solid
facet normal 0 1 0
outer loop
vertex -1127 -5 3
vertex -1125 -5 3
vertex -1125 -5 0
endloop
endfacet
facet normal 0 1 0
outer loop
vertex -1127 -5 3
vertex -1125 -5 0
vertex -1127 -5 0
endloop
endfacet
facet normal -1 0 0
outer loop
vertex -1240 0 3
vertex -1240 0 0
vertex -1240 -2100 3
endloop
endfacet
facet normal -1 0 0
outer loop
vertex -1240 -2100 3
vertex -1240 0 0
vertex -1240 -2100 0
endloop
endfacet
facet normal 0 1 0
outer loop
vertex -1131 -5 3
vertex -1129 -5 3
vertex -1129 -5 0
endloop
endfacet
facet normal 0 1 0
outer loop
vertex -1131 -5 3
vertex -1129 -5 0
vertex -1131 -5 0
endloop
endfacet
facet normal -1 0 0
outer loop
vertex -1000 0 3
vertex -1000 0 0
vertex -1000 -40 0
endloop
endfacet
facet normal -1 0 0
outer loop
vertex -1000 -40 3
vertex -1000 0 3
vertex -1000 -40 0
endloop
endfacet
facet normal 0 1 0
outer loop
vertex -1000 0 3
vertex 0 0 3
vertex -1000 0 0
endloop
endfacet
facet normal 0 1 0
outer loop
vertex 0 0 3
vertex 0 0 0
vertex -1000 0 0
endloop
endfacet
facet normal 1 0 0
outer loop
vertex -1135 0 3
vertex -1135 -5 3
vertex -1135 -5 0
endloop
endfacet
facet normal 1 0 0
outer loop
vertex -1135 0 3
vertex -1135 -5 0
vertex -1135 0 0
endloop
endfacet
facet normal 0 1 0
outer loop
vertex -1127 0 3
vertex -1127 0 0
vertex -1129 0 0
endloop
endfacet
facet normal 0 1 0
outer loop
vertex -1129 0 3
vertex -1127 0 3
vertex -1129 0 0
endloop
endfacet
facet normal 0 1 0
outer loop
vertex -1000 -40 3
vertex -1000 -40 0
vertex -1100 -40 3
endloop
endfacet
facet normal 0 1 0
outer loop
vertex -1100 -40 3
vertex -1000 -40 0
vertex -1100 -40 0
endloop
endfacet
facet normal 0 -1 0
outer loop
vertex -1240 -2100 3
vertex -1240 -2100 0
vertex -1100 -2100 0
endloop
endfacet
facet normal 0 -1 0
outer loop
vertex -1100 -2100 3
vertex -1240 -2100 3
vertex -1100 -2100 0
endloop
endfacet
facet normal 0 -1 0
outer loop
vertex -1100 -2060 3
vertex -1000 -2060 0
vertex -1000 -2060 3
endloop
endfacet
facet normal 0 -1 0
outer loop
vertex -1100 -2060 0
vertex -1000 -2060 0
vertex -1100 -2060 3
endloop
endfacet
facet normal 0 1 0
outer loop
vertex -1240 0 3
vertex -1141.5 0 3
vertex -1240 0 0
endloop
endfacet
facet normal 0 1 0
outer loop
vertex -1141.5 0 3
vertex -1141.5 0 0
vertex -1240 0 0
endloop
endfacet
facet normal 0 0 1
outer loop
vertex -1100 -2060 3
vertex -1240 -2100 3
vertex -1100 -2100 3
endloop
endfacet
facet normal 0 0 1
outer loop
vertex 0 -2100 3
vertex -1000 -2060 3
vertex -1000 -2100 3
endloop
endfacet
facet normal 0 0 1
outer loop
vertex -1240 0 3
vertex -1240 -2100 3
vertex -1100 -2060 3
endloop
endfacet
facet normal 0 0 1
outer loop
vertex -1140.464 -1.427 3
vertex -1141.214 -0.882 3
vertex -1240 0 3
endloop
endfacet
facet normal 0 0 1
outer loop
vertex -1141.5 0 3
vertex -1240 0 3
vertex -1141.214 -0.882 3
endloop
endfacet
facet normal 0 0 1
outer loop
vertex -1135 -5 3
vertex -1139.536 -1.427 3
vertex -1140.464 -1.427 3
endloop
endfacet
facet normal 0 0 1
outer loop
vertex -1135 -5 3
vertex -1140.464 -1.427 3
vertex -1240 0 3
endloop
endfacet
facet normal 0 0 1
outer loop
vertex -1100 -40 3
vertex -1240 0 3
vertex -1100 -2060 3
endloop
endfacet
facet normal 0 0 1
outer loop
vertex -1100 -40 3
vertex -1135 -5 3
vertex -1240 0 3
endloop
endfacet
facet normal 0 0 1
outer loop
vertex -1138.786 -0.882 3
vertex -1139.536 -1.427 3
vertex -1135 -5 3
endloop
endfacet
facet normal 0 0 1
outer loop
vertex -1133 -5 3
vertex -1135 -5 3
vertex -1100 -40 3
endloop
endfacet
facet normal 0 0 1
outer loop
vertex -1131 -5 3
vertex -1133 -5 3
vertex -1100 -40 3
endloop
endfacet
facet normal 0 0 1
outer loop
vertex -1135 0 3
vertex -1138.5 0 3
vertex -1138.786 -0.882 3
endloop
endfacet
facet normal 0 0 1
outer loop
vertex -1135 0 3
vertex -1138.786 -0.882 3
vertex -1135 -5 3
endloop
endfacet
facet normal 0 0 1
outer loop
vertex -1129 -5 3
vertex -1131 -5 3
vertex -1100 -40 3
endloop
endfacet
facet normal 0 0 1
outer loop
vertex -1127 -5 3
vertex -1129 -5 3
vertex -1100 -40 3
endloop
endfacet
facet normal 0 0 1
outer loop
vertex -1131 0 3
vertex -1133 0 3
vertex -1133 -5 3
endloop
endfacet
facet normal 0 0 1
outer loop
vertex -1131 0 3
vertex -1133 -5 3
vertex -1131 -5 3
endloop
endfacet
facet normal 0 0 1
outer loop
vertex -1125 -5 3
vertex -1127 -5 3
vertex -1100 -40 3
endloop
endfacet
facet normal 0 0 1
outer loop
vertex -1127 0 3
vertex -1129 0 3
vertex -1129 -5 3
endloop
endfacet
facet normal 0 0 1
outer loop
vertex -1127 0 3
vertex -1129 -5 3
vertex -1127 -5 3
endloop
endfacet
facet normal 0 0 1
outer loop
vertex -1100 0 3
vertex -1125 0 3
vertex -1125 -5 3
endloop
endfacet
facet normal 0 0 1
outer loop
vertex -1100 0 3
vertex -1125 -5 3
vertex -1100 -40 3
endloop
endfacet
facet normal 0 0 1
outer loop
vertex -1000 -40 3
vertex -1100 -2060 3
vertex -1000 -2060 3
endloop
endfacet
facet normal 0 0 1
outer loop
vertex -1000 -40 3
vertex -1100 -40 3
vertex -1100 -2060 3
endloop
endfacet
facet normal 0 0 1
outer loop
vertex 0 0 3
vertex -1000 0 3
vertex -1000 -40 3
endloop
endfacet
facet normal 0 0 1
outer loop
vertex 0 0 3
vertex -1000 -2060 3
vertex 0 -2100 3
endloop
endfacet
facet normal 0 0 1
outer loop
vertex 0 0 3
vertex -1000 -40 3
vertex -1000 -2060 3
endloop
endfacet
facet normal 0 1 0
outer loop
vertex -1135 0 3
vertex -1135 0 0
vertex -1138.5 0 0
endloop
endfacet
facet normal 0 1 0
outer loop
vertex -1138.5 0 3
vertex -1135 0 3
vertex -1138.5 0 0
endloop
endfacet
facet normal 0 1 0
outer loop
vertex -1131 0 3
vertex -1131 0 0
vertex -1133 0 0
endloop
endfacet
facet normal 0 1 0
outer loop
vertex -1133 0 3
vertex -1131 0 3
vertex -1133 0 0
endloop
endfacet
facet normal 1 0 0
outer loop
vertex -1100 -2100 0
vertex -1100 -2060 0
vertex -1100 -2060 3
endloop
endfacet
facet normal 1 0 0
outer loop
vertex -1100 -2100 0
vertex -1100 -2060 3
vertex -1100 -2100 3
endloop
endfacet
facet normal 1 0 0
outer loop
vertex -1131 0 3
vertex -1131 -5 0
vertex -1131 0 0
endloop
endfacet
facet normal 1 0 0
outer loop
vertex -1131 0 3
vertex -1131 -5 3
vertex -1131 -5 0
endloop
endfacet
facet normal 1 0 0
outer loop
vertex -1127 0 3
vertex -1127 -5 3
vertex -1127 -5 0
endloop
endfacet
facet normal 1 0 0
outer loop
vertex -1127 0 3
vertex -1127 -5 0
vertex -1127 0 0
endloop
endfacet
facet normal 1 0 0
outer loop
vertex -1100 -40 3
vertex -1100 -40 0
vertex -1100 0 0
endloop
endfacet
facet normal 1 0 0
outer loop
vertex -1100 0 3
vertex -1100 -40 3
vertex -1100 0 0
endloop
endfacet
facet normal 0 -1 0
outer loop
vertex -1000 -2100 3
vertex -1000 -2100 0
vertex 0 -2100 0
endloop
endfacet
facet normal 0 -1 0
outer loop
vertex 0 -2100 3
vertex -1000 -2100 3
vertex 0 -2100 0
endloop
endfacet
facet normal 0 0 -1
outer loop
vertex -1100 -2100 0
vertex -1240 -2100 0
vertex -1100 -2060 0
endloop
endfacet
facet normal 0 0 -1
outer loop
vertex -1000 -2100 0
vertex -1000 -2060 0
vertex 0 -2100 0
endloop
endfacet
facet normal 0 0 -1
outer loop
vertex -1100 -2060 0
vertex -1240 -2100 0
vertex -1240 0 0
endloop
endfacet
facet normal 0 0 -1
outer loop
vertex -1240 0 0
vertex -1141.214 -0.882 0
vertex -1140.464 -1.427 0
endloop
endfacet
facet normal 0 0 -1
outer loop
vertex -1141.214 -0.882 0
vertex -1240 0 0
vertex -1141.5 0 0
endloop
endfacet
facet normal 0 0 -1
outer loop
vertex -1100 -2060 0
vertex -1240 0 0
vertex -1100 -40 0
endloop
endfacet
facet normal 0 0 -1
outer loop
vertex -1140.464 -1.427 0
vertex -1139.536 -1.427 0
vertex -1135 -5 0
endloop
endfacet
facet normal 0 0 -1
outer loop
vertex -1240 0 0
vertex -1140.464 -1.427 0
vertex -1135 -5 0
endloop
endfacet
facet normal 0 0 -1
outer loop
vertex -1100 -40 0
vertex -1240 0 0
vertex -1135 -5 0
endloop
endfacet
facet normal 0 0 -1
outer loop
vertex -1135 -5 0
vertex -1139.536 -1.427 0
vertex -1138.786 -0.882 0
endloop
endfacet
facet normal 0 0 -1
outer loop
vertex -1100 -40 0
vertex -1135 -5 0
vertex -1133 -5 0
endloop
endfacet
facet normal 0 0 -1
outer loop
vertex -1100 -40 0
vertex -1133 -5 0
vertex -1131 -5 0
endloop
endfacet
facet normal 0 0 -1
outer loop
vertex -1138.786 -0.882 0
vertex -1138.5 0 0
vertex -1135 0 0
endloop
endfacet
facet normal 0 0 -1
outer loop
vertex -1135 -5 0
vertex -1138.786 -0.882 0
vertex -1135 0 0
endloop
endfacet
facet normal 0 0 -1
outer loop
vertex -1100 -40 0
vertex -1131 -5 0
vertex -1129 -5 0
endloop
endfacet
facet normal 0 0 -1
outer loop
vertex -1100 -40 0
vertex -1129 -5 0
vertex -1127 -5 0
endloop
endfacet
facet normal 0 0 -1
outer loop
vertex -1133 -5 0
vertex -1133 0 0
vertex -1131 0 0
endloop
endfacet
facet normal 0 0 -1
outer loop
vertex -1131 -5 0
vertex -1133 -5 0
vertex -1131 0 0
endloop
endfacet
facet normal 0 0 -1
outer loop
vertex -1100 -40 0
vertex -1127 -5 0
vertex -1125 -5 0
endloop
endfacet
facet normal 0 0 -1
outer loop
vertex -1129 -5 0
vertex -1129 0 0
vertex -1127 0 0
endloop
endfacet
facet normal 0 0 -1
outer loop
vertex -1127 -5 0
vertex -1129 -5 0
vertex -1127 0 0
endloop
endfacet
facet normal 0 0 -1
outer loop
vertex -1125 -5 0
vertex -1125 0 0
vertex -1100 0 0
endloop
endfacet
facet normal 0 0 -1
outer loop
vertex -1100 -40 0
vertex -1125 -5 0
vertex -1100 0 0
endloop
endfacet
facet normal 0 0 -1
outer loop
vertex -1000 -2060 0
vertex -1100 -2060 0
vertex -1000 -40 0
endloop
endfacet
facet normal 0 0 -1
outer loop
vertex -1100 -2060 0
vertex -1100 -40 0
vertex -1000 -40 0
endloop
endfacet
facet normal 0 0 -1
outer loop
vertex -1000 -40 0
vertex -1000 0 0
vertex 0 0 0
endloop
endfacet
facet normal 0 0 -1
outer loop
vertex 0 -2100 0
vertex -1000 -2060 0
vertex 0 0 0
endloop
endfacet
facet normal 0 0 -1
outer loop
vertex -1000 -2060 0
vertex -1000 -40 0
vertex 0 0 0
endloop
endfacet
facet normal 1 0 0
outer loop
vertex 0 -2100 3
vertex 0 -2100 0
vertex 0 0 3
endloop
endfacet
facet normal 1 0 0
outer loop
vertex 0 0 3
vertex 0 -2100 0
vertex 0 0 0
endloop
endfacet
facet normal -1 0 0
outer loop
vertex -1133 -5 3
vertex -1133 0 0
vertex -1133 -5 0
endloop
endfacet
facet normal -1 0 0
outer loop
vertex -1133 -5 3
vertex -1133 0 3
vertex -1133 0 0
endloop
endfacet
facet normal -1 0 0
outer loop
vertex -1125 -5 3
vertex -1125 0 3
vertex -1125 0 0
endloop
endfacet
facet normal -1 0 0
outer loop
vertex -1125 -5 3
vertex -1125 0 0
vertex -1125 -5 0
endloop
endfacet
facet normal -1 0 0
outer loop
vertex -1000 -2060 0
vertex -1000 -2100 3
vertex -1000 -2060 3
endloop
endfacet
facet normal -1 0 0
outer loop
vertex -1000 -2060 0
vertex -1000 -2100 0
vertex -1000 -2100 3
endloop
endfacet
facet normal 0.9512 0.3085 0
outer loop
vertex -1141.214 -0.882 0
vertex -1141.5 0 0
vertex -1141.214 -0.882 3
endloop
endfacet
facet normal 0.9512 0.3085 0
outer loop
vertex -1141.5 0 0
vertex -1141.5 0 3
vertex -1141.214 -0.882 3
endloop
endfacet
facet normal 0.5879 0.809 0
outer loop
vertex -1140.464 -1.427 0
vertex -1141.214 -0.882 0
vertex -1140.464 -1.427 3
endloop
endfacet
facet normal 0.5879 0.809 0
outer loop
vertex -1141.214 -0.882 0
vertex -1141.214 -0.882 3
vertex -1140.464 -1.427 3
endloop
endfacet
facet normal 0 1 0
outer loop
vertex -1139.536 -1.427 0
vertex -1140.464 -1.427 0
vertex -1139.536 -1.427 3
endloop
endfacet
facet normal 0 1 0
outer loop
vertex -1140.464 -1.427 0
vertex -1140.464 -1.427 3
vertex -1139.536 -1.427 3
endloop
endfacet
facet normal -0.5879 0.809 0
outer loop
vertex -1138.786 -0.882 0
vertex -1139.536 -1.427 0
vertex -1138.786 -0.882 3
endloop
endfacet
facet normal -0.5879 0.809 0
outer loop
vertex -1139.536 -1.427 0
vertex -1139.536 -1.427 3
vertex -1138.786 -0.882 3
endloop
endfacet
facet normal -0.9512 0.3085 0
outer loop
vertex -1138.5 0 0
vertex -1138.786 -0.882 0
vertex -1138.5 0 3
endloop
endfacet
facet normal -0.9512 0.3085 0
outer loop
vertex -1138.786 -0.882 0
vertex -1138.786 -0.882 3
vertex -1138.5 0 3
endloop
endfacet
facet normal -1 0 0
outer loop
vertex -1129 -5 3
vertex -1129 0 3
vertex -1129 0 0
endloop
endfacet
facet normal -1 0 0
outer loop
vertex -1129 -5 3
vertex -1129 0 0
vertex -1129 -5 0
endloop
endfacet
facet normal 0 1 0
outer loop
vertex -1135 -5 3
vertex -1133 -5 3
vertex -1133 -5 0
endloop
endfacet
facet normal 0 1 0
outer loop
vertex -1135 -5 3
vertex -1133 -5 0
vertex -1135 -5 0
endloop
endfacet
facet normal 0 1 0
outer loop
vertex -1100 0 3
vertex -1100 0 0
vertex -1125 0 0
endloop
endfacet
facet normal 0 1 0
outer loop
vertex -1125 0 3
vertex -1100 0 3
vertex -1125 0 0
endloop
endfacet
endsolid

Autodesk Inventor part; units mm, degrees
ref_plane "YZ Plane" through (0, 0, 0) normal (1, 0, 0) x (0, 1, 0)
ref_plane "XZ Plane" through (0, 0, 0) normal (0, 1, 0) x (-1, 0, 0)
ref_plane "XY Plane" through (0, 0, 0) normal (0, 0, 1) x (1, 0, 0)
sketch "Sketch1" plane through (0, 0, 0) normal (0, 0, 1) x (1, 0, 0)
  line L0 (0, 0) -> (-1240, 0)
  line L1 (-1240, 0) -> (-1240, -2100)
  line L2 (-1240, -2100) -> (0, -2100)
  line L3 (0, -2100) -> (0, 0)
  line L4 (0, 0) -> (-40, 0)
  line L5 (-40, 0) -> (-40, -40)
  line L6 (-40, -40) -> (0, -40)
  line L7 (0, -40) -> (0, 0)
  line L8 (0, -2100) -> (-40, -2100)
  line L9 (-40, -2100) -> (-40, -2060)
  line L10 (-40, -2060) -> (0, -2060)
  line L11 (0, -2060) -> (0, -2100)
  line L12 (-1240, 0) -> (-1200, 0)
  line L13 (-1200, 0) -> (-1200, -40)
  line L14 (-1200, -40) -> (-1240, -40)
  line L15 (-1240, -40) -> (-1240, 0)
  line L16 (-1240, -2100) -> (-1200, -2100)
  line L17 (-1200, -2100) -> (-1200, -2060)
  line L18 (-1200, -2060) -> (-1240, -2060)
  line L19 (-1240, -2060) -> (-1240, -2100)
  line L20 (-1100, -2100) -> (-1000, -2100)
  line L21 (-1000, -2100) -> (-1000, -2060)
  line L22 (-1000, -2060) -> (-1100, -2060)
  line L23 (-1100, -2060) -> (-1100, -2100)
  line L24 (-1100, 0) -> (-1000, 0)
  line L25 (-1000, 0) -> (-1000, -40)
  line L26 (-1000, -40) -> (-1100, -40)
  line L27 (-1100, -40) -> (-1100, 0)
  point P0 (0, -40)
  point P1 (-40, 0)
  point P2 (-40, -2100)
  point P3 (0, -2060)
  point P4 (-1000, -2100)
  point P5 (-1000, 0)
  dimension "d22" = 1240
  dimension "d23" = 2100
  dimension "d24" = 40
  dimension "d25" = 40
  dimension "d28" = 100
  dimension "d29" = 960
extrude "Plate1" add sketch "Sketch1" along normal blind 3 contours L3 L6 L5 L0 | L5 L6 L3 L10 L9 L2 L21 L22 L23 L17 L18 L1 L14 L13 L0 L27 L26 L25 | L3 L2 L9 L10 | L13 L14 L1 L0 | L18 L17 L2 L1
sketch "Sketch6" plane through (0, 0, 3) normal (0, 0, 1) x (1, 0, 0)
  line L0 (-1135, 0) -> (-1133, 0)
  line L1 (-1127, -5) -> (-1127, 0)
  line L2 (-1127, 0) -> (-1125, 0)
  line L3 (-1125, 0) -> (-1125, -5)
  line L4 (-1125, 0) -> (-1123, 0) construction
  line L5 (-1123, 0) -> (-1121.9884, -4.6072)
  arc A0 (-1121.9884, -4.6072) -> (-1121.0116, -4.6072) centre (-1121.5, -4.5) ccw
  line L6 (-1123, 0) -> (-1120, 0)
  line L7 (-1120, 0) -> (-1118, 0) construction
  line L8 (-1118, -5) -> (-1118, 0)
  line L9 (-1116, -5) -> (-1118, -5)
  line L10 (-1116, 0) -> (-1116, -5)
  line L11 (-1118, 0) -> (-1116, 0)
  line L12 (-1116, -2.5) -> (-1114, -2.5) construction
  line L13 (-1121.0116, -4.6072) -> (-1120, 0)
  line L14 (-1133, 0) -> (-1133, -5)
  line L15 (-1133, -5) -> (-1135, -5)
  line L16 (-1135, -5) -> (-1135, 0)
  line L17 (-1125, -5) -> (-1127, -5)
  line L18 (-1129, 0) -> (-1129, -5)
  line L19 (-1129, -5) -> (-1131, -5)
  line L20 (-1131, -5) -> (-1131, 0)
  line L21 (-1131, 0) -> (-1129, 0)
  line L22 (-1129, -2.5) -> (-1127, -2.5) construction
  line L23 (-1133, -2.5) -> (-1131, -2.5) construction
  line L24 (-1114, -5) -> (-1114, 0)
  line L25 (-1112, 0) -> (-1112, -5)
  line L26 (-1112, -5) -> (-1114, -5)
  line L27 (-1114, 0) -> (-1112, 0)
  line L28 (-1112, -2.5) -> (-1110, -2.5) construction
  line L29 (-1110, -5) -> (-1110, 0)
  line L30 (-1110, 0) -> (-1108, 0)
  line L31 (-1108, -5) -> (-1110, -5)
  arc A1 (-1141.5, 0) -> (-1138.5, 0) centre (-1140, 0) ccw
  line L32 (-1108, 0) -> (-1108, -5)
  line L33 (-1240, 0) -> (-1100, 0) projected
  line L34 (-1240, -2100) -> (-1240, 0) projected
  point P0 (0, 0)
  point P1 (-1121.5, 0)
  dimension "d38" = 2
  dimension "d39" = 5
  dimension "d40" = 0.5
  dimension "d41" = 3
  dimension "d42" = 2
  dimension "d43" = 5
  dimension "d44" = 3
  dimension "d45" = 5
  dimension "d46" = 100
extrude "Cut1" cut sketch "Sketch6" against normal blind 3 contours L2 L3 L17 L1 | L21 L18 L19 L20 | L0 L14 L15 L16 | A1 L33
equation "\"d24\" = d25"
equation "\"d40\" = 0.25 * d38"
equation "\"d47\" = Thickness"
equation "\"d2\" = Thickness"
equation "\"BendReliefWidth\" = Thickness"
equation "\"BendReliefDepth\" = 0.5 * Thickness"
equation "\"CornerReliefSize\" = 4 * Thickness"
equation "\"MinimumRemnant\" = 2 * Thickness"
equation "\"TransitionRadius\" = BendRadius"
equation "\"JacobiRadiusSize\" = BendRadius"
equation "\"GapSize\" = Thickness"
equation "\"Thickness\" = 3"
equation "\"BendRadius\" = 5"
properties part number "GnG frame 1.1 floor sheet 3" material "Stainless Steel"
